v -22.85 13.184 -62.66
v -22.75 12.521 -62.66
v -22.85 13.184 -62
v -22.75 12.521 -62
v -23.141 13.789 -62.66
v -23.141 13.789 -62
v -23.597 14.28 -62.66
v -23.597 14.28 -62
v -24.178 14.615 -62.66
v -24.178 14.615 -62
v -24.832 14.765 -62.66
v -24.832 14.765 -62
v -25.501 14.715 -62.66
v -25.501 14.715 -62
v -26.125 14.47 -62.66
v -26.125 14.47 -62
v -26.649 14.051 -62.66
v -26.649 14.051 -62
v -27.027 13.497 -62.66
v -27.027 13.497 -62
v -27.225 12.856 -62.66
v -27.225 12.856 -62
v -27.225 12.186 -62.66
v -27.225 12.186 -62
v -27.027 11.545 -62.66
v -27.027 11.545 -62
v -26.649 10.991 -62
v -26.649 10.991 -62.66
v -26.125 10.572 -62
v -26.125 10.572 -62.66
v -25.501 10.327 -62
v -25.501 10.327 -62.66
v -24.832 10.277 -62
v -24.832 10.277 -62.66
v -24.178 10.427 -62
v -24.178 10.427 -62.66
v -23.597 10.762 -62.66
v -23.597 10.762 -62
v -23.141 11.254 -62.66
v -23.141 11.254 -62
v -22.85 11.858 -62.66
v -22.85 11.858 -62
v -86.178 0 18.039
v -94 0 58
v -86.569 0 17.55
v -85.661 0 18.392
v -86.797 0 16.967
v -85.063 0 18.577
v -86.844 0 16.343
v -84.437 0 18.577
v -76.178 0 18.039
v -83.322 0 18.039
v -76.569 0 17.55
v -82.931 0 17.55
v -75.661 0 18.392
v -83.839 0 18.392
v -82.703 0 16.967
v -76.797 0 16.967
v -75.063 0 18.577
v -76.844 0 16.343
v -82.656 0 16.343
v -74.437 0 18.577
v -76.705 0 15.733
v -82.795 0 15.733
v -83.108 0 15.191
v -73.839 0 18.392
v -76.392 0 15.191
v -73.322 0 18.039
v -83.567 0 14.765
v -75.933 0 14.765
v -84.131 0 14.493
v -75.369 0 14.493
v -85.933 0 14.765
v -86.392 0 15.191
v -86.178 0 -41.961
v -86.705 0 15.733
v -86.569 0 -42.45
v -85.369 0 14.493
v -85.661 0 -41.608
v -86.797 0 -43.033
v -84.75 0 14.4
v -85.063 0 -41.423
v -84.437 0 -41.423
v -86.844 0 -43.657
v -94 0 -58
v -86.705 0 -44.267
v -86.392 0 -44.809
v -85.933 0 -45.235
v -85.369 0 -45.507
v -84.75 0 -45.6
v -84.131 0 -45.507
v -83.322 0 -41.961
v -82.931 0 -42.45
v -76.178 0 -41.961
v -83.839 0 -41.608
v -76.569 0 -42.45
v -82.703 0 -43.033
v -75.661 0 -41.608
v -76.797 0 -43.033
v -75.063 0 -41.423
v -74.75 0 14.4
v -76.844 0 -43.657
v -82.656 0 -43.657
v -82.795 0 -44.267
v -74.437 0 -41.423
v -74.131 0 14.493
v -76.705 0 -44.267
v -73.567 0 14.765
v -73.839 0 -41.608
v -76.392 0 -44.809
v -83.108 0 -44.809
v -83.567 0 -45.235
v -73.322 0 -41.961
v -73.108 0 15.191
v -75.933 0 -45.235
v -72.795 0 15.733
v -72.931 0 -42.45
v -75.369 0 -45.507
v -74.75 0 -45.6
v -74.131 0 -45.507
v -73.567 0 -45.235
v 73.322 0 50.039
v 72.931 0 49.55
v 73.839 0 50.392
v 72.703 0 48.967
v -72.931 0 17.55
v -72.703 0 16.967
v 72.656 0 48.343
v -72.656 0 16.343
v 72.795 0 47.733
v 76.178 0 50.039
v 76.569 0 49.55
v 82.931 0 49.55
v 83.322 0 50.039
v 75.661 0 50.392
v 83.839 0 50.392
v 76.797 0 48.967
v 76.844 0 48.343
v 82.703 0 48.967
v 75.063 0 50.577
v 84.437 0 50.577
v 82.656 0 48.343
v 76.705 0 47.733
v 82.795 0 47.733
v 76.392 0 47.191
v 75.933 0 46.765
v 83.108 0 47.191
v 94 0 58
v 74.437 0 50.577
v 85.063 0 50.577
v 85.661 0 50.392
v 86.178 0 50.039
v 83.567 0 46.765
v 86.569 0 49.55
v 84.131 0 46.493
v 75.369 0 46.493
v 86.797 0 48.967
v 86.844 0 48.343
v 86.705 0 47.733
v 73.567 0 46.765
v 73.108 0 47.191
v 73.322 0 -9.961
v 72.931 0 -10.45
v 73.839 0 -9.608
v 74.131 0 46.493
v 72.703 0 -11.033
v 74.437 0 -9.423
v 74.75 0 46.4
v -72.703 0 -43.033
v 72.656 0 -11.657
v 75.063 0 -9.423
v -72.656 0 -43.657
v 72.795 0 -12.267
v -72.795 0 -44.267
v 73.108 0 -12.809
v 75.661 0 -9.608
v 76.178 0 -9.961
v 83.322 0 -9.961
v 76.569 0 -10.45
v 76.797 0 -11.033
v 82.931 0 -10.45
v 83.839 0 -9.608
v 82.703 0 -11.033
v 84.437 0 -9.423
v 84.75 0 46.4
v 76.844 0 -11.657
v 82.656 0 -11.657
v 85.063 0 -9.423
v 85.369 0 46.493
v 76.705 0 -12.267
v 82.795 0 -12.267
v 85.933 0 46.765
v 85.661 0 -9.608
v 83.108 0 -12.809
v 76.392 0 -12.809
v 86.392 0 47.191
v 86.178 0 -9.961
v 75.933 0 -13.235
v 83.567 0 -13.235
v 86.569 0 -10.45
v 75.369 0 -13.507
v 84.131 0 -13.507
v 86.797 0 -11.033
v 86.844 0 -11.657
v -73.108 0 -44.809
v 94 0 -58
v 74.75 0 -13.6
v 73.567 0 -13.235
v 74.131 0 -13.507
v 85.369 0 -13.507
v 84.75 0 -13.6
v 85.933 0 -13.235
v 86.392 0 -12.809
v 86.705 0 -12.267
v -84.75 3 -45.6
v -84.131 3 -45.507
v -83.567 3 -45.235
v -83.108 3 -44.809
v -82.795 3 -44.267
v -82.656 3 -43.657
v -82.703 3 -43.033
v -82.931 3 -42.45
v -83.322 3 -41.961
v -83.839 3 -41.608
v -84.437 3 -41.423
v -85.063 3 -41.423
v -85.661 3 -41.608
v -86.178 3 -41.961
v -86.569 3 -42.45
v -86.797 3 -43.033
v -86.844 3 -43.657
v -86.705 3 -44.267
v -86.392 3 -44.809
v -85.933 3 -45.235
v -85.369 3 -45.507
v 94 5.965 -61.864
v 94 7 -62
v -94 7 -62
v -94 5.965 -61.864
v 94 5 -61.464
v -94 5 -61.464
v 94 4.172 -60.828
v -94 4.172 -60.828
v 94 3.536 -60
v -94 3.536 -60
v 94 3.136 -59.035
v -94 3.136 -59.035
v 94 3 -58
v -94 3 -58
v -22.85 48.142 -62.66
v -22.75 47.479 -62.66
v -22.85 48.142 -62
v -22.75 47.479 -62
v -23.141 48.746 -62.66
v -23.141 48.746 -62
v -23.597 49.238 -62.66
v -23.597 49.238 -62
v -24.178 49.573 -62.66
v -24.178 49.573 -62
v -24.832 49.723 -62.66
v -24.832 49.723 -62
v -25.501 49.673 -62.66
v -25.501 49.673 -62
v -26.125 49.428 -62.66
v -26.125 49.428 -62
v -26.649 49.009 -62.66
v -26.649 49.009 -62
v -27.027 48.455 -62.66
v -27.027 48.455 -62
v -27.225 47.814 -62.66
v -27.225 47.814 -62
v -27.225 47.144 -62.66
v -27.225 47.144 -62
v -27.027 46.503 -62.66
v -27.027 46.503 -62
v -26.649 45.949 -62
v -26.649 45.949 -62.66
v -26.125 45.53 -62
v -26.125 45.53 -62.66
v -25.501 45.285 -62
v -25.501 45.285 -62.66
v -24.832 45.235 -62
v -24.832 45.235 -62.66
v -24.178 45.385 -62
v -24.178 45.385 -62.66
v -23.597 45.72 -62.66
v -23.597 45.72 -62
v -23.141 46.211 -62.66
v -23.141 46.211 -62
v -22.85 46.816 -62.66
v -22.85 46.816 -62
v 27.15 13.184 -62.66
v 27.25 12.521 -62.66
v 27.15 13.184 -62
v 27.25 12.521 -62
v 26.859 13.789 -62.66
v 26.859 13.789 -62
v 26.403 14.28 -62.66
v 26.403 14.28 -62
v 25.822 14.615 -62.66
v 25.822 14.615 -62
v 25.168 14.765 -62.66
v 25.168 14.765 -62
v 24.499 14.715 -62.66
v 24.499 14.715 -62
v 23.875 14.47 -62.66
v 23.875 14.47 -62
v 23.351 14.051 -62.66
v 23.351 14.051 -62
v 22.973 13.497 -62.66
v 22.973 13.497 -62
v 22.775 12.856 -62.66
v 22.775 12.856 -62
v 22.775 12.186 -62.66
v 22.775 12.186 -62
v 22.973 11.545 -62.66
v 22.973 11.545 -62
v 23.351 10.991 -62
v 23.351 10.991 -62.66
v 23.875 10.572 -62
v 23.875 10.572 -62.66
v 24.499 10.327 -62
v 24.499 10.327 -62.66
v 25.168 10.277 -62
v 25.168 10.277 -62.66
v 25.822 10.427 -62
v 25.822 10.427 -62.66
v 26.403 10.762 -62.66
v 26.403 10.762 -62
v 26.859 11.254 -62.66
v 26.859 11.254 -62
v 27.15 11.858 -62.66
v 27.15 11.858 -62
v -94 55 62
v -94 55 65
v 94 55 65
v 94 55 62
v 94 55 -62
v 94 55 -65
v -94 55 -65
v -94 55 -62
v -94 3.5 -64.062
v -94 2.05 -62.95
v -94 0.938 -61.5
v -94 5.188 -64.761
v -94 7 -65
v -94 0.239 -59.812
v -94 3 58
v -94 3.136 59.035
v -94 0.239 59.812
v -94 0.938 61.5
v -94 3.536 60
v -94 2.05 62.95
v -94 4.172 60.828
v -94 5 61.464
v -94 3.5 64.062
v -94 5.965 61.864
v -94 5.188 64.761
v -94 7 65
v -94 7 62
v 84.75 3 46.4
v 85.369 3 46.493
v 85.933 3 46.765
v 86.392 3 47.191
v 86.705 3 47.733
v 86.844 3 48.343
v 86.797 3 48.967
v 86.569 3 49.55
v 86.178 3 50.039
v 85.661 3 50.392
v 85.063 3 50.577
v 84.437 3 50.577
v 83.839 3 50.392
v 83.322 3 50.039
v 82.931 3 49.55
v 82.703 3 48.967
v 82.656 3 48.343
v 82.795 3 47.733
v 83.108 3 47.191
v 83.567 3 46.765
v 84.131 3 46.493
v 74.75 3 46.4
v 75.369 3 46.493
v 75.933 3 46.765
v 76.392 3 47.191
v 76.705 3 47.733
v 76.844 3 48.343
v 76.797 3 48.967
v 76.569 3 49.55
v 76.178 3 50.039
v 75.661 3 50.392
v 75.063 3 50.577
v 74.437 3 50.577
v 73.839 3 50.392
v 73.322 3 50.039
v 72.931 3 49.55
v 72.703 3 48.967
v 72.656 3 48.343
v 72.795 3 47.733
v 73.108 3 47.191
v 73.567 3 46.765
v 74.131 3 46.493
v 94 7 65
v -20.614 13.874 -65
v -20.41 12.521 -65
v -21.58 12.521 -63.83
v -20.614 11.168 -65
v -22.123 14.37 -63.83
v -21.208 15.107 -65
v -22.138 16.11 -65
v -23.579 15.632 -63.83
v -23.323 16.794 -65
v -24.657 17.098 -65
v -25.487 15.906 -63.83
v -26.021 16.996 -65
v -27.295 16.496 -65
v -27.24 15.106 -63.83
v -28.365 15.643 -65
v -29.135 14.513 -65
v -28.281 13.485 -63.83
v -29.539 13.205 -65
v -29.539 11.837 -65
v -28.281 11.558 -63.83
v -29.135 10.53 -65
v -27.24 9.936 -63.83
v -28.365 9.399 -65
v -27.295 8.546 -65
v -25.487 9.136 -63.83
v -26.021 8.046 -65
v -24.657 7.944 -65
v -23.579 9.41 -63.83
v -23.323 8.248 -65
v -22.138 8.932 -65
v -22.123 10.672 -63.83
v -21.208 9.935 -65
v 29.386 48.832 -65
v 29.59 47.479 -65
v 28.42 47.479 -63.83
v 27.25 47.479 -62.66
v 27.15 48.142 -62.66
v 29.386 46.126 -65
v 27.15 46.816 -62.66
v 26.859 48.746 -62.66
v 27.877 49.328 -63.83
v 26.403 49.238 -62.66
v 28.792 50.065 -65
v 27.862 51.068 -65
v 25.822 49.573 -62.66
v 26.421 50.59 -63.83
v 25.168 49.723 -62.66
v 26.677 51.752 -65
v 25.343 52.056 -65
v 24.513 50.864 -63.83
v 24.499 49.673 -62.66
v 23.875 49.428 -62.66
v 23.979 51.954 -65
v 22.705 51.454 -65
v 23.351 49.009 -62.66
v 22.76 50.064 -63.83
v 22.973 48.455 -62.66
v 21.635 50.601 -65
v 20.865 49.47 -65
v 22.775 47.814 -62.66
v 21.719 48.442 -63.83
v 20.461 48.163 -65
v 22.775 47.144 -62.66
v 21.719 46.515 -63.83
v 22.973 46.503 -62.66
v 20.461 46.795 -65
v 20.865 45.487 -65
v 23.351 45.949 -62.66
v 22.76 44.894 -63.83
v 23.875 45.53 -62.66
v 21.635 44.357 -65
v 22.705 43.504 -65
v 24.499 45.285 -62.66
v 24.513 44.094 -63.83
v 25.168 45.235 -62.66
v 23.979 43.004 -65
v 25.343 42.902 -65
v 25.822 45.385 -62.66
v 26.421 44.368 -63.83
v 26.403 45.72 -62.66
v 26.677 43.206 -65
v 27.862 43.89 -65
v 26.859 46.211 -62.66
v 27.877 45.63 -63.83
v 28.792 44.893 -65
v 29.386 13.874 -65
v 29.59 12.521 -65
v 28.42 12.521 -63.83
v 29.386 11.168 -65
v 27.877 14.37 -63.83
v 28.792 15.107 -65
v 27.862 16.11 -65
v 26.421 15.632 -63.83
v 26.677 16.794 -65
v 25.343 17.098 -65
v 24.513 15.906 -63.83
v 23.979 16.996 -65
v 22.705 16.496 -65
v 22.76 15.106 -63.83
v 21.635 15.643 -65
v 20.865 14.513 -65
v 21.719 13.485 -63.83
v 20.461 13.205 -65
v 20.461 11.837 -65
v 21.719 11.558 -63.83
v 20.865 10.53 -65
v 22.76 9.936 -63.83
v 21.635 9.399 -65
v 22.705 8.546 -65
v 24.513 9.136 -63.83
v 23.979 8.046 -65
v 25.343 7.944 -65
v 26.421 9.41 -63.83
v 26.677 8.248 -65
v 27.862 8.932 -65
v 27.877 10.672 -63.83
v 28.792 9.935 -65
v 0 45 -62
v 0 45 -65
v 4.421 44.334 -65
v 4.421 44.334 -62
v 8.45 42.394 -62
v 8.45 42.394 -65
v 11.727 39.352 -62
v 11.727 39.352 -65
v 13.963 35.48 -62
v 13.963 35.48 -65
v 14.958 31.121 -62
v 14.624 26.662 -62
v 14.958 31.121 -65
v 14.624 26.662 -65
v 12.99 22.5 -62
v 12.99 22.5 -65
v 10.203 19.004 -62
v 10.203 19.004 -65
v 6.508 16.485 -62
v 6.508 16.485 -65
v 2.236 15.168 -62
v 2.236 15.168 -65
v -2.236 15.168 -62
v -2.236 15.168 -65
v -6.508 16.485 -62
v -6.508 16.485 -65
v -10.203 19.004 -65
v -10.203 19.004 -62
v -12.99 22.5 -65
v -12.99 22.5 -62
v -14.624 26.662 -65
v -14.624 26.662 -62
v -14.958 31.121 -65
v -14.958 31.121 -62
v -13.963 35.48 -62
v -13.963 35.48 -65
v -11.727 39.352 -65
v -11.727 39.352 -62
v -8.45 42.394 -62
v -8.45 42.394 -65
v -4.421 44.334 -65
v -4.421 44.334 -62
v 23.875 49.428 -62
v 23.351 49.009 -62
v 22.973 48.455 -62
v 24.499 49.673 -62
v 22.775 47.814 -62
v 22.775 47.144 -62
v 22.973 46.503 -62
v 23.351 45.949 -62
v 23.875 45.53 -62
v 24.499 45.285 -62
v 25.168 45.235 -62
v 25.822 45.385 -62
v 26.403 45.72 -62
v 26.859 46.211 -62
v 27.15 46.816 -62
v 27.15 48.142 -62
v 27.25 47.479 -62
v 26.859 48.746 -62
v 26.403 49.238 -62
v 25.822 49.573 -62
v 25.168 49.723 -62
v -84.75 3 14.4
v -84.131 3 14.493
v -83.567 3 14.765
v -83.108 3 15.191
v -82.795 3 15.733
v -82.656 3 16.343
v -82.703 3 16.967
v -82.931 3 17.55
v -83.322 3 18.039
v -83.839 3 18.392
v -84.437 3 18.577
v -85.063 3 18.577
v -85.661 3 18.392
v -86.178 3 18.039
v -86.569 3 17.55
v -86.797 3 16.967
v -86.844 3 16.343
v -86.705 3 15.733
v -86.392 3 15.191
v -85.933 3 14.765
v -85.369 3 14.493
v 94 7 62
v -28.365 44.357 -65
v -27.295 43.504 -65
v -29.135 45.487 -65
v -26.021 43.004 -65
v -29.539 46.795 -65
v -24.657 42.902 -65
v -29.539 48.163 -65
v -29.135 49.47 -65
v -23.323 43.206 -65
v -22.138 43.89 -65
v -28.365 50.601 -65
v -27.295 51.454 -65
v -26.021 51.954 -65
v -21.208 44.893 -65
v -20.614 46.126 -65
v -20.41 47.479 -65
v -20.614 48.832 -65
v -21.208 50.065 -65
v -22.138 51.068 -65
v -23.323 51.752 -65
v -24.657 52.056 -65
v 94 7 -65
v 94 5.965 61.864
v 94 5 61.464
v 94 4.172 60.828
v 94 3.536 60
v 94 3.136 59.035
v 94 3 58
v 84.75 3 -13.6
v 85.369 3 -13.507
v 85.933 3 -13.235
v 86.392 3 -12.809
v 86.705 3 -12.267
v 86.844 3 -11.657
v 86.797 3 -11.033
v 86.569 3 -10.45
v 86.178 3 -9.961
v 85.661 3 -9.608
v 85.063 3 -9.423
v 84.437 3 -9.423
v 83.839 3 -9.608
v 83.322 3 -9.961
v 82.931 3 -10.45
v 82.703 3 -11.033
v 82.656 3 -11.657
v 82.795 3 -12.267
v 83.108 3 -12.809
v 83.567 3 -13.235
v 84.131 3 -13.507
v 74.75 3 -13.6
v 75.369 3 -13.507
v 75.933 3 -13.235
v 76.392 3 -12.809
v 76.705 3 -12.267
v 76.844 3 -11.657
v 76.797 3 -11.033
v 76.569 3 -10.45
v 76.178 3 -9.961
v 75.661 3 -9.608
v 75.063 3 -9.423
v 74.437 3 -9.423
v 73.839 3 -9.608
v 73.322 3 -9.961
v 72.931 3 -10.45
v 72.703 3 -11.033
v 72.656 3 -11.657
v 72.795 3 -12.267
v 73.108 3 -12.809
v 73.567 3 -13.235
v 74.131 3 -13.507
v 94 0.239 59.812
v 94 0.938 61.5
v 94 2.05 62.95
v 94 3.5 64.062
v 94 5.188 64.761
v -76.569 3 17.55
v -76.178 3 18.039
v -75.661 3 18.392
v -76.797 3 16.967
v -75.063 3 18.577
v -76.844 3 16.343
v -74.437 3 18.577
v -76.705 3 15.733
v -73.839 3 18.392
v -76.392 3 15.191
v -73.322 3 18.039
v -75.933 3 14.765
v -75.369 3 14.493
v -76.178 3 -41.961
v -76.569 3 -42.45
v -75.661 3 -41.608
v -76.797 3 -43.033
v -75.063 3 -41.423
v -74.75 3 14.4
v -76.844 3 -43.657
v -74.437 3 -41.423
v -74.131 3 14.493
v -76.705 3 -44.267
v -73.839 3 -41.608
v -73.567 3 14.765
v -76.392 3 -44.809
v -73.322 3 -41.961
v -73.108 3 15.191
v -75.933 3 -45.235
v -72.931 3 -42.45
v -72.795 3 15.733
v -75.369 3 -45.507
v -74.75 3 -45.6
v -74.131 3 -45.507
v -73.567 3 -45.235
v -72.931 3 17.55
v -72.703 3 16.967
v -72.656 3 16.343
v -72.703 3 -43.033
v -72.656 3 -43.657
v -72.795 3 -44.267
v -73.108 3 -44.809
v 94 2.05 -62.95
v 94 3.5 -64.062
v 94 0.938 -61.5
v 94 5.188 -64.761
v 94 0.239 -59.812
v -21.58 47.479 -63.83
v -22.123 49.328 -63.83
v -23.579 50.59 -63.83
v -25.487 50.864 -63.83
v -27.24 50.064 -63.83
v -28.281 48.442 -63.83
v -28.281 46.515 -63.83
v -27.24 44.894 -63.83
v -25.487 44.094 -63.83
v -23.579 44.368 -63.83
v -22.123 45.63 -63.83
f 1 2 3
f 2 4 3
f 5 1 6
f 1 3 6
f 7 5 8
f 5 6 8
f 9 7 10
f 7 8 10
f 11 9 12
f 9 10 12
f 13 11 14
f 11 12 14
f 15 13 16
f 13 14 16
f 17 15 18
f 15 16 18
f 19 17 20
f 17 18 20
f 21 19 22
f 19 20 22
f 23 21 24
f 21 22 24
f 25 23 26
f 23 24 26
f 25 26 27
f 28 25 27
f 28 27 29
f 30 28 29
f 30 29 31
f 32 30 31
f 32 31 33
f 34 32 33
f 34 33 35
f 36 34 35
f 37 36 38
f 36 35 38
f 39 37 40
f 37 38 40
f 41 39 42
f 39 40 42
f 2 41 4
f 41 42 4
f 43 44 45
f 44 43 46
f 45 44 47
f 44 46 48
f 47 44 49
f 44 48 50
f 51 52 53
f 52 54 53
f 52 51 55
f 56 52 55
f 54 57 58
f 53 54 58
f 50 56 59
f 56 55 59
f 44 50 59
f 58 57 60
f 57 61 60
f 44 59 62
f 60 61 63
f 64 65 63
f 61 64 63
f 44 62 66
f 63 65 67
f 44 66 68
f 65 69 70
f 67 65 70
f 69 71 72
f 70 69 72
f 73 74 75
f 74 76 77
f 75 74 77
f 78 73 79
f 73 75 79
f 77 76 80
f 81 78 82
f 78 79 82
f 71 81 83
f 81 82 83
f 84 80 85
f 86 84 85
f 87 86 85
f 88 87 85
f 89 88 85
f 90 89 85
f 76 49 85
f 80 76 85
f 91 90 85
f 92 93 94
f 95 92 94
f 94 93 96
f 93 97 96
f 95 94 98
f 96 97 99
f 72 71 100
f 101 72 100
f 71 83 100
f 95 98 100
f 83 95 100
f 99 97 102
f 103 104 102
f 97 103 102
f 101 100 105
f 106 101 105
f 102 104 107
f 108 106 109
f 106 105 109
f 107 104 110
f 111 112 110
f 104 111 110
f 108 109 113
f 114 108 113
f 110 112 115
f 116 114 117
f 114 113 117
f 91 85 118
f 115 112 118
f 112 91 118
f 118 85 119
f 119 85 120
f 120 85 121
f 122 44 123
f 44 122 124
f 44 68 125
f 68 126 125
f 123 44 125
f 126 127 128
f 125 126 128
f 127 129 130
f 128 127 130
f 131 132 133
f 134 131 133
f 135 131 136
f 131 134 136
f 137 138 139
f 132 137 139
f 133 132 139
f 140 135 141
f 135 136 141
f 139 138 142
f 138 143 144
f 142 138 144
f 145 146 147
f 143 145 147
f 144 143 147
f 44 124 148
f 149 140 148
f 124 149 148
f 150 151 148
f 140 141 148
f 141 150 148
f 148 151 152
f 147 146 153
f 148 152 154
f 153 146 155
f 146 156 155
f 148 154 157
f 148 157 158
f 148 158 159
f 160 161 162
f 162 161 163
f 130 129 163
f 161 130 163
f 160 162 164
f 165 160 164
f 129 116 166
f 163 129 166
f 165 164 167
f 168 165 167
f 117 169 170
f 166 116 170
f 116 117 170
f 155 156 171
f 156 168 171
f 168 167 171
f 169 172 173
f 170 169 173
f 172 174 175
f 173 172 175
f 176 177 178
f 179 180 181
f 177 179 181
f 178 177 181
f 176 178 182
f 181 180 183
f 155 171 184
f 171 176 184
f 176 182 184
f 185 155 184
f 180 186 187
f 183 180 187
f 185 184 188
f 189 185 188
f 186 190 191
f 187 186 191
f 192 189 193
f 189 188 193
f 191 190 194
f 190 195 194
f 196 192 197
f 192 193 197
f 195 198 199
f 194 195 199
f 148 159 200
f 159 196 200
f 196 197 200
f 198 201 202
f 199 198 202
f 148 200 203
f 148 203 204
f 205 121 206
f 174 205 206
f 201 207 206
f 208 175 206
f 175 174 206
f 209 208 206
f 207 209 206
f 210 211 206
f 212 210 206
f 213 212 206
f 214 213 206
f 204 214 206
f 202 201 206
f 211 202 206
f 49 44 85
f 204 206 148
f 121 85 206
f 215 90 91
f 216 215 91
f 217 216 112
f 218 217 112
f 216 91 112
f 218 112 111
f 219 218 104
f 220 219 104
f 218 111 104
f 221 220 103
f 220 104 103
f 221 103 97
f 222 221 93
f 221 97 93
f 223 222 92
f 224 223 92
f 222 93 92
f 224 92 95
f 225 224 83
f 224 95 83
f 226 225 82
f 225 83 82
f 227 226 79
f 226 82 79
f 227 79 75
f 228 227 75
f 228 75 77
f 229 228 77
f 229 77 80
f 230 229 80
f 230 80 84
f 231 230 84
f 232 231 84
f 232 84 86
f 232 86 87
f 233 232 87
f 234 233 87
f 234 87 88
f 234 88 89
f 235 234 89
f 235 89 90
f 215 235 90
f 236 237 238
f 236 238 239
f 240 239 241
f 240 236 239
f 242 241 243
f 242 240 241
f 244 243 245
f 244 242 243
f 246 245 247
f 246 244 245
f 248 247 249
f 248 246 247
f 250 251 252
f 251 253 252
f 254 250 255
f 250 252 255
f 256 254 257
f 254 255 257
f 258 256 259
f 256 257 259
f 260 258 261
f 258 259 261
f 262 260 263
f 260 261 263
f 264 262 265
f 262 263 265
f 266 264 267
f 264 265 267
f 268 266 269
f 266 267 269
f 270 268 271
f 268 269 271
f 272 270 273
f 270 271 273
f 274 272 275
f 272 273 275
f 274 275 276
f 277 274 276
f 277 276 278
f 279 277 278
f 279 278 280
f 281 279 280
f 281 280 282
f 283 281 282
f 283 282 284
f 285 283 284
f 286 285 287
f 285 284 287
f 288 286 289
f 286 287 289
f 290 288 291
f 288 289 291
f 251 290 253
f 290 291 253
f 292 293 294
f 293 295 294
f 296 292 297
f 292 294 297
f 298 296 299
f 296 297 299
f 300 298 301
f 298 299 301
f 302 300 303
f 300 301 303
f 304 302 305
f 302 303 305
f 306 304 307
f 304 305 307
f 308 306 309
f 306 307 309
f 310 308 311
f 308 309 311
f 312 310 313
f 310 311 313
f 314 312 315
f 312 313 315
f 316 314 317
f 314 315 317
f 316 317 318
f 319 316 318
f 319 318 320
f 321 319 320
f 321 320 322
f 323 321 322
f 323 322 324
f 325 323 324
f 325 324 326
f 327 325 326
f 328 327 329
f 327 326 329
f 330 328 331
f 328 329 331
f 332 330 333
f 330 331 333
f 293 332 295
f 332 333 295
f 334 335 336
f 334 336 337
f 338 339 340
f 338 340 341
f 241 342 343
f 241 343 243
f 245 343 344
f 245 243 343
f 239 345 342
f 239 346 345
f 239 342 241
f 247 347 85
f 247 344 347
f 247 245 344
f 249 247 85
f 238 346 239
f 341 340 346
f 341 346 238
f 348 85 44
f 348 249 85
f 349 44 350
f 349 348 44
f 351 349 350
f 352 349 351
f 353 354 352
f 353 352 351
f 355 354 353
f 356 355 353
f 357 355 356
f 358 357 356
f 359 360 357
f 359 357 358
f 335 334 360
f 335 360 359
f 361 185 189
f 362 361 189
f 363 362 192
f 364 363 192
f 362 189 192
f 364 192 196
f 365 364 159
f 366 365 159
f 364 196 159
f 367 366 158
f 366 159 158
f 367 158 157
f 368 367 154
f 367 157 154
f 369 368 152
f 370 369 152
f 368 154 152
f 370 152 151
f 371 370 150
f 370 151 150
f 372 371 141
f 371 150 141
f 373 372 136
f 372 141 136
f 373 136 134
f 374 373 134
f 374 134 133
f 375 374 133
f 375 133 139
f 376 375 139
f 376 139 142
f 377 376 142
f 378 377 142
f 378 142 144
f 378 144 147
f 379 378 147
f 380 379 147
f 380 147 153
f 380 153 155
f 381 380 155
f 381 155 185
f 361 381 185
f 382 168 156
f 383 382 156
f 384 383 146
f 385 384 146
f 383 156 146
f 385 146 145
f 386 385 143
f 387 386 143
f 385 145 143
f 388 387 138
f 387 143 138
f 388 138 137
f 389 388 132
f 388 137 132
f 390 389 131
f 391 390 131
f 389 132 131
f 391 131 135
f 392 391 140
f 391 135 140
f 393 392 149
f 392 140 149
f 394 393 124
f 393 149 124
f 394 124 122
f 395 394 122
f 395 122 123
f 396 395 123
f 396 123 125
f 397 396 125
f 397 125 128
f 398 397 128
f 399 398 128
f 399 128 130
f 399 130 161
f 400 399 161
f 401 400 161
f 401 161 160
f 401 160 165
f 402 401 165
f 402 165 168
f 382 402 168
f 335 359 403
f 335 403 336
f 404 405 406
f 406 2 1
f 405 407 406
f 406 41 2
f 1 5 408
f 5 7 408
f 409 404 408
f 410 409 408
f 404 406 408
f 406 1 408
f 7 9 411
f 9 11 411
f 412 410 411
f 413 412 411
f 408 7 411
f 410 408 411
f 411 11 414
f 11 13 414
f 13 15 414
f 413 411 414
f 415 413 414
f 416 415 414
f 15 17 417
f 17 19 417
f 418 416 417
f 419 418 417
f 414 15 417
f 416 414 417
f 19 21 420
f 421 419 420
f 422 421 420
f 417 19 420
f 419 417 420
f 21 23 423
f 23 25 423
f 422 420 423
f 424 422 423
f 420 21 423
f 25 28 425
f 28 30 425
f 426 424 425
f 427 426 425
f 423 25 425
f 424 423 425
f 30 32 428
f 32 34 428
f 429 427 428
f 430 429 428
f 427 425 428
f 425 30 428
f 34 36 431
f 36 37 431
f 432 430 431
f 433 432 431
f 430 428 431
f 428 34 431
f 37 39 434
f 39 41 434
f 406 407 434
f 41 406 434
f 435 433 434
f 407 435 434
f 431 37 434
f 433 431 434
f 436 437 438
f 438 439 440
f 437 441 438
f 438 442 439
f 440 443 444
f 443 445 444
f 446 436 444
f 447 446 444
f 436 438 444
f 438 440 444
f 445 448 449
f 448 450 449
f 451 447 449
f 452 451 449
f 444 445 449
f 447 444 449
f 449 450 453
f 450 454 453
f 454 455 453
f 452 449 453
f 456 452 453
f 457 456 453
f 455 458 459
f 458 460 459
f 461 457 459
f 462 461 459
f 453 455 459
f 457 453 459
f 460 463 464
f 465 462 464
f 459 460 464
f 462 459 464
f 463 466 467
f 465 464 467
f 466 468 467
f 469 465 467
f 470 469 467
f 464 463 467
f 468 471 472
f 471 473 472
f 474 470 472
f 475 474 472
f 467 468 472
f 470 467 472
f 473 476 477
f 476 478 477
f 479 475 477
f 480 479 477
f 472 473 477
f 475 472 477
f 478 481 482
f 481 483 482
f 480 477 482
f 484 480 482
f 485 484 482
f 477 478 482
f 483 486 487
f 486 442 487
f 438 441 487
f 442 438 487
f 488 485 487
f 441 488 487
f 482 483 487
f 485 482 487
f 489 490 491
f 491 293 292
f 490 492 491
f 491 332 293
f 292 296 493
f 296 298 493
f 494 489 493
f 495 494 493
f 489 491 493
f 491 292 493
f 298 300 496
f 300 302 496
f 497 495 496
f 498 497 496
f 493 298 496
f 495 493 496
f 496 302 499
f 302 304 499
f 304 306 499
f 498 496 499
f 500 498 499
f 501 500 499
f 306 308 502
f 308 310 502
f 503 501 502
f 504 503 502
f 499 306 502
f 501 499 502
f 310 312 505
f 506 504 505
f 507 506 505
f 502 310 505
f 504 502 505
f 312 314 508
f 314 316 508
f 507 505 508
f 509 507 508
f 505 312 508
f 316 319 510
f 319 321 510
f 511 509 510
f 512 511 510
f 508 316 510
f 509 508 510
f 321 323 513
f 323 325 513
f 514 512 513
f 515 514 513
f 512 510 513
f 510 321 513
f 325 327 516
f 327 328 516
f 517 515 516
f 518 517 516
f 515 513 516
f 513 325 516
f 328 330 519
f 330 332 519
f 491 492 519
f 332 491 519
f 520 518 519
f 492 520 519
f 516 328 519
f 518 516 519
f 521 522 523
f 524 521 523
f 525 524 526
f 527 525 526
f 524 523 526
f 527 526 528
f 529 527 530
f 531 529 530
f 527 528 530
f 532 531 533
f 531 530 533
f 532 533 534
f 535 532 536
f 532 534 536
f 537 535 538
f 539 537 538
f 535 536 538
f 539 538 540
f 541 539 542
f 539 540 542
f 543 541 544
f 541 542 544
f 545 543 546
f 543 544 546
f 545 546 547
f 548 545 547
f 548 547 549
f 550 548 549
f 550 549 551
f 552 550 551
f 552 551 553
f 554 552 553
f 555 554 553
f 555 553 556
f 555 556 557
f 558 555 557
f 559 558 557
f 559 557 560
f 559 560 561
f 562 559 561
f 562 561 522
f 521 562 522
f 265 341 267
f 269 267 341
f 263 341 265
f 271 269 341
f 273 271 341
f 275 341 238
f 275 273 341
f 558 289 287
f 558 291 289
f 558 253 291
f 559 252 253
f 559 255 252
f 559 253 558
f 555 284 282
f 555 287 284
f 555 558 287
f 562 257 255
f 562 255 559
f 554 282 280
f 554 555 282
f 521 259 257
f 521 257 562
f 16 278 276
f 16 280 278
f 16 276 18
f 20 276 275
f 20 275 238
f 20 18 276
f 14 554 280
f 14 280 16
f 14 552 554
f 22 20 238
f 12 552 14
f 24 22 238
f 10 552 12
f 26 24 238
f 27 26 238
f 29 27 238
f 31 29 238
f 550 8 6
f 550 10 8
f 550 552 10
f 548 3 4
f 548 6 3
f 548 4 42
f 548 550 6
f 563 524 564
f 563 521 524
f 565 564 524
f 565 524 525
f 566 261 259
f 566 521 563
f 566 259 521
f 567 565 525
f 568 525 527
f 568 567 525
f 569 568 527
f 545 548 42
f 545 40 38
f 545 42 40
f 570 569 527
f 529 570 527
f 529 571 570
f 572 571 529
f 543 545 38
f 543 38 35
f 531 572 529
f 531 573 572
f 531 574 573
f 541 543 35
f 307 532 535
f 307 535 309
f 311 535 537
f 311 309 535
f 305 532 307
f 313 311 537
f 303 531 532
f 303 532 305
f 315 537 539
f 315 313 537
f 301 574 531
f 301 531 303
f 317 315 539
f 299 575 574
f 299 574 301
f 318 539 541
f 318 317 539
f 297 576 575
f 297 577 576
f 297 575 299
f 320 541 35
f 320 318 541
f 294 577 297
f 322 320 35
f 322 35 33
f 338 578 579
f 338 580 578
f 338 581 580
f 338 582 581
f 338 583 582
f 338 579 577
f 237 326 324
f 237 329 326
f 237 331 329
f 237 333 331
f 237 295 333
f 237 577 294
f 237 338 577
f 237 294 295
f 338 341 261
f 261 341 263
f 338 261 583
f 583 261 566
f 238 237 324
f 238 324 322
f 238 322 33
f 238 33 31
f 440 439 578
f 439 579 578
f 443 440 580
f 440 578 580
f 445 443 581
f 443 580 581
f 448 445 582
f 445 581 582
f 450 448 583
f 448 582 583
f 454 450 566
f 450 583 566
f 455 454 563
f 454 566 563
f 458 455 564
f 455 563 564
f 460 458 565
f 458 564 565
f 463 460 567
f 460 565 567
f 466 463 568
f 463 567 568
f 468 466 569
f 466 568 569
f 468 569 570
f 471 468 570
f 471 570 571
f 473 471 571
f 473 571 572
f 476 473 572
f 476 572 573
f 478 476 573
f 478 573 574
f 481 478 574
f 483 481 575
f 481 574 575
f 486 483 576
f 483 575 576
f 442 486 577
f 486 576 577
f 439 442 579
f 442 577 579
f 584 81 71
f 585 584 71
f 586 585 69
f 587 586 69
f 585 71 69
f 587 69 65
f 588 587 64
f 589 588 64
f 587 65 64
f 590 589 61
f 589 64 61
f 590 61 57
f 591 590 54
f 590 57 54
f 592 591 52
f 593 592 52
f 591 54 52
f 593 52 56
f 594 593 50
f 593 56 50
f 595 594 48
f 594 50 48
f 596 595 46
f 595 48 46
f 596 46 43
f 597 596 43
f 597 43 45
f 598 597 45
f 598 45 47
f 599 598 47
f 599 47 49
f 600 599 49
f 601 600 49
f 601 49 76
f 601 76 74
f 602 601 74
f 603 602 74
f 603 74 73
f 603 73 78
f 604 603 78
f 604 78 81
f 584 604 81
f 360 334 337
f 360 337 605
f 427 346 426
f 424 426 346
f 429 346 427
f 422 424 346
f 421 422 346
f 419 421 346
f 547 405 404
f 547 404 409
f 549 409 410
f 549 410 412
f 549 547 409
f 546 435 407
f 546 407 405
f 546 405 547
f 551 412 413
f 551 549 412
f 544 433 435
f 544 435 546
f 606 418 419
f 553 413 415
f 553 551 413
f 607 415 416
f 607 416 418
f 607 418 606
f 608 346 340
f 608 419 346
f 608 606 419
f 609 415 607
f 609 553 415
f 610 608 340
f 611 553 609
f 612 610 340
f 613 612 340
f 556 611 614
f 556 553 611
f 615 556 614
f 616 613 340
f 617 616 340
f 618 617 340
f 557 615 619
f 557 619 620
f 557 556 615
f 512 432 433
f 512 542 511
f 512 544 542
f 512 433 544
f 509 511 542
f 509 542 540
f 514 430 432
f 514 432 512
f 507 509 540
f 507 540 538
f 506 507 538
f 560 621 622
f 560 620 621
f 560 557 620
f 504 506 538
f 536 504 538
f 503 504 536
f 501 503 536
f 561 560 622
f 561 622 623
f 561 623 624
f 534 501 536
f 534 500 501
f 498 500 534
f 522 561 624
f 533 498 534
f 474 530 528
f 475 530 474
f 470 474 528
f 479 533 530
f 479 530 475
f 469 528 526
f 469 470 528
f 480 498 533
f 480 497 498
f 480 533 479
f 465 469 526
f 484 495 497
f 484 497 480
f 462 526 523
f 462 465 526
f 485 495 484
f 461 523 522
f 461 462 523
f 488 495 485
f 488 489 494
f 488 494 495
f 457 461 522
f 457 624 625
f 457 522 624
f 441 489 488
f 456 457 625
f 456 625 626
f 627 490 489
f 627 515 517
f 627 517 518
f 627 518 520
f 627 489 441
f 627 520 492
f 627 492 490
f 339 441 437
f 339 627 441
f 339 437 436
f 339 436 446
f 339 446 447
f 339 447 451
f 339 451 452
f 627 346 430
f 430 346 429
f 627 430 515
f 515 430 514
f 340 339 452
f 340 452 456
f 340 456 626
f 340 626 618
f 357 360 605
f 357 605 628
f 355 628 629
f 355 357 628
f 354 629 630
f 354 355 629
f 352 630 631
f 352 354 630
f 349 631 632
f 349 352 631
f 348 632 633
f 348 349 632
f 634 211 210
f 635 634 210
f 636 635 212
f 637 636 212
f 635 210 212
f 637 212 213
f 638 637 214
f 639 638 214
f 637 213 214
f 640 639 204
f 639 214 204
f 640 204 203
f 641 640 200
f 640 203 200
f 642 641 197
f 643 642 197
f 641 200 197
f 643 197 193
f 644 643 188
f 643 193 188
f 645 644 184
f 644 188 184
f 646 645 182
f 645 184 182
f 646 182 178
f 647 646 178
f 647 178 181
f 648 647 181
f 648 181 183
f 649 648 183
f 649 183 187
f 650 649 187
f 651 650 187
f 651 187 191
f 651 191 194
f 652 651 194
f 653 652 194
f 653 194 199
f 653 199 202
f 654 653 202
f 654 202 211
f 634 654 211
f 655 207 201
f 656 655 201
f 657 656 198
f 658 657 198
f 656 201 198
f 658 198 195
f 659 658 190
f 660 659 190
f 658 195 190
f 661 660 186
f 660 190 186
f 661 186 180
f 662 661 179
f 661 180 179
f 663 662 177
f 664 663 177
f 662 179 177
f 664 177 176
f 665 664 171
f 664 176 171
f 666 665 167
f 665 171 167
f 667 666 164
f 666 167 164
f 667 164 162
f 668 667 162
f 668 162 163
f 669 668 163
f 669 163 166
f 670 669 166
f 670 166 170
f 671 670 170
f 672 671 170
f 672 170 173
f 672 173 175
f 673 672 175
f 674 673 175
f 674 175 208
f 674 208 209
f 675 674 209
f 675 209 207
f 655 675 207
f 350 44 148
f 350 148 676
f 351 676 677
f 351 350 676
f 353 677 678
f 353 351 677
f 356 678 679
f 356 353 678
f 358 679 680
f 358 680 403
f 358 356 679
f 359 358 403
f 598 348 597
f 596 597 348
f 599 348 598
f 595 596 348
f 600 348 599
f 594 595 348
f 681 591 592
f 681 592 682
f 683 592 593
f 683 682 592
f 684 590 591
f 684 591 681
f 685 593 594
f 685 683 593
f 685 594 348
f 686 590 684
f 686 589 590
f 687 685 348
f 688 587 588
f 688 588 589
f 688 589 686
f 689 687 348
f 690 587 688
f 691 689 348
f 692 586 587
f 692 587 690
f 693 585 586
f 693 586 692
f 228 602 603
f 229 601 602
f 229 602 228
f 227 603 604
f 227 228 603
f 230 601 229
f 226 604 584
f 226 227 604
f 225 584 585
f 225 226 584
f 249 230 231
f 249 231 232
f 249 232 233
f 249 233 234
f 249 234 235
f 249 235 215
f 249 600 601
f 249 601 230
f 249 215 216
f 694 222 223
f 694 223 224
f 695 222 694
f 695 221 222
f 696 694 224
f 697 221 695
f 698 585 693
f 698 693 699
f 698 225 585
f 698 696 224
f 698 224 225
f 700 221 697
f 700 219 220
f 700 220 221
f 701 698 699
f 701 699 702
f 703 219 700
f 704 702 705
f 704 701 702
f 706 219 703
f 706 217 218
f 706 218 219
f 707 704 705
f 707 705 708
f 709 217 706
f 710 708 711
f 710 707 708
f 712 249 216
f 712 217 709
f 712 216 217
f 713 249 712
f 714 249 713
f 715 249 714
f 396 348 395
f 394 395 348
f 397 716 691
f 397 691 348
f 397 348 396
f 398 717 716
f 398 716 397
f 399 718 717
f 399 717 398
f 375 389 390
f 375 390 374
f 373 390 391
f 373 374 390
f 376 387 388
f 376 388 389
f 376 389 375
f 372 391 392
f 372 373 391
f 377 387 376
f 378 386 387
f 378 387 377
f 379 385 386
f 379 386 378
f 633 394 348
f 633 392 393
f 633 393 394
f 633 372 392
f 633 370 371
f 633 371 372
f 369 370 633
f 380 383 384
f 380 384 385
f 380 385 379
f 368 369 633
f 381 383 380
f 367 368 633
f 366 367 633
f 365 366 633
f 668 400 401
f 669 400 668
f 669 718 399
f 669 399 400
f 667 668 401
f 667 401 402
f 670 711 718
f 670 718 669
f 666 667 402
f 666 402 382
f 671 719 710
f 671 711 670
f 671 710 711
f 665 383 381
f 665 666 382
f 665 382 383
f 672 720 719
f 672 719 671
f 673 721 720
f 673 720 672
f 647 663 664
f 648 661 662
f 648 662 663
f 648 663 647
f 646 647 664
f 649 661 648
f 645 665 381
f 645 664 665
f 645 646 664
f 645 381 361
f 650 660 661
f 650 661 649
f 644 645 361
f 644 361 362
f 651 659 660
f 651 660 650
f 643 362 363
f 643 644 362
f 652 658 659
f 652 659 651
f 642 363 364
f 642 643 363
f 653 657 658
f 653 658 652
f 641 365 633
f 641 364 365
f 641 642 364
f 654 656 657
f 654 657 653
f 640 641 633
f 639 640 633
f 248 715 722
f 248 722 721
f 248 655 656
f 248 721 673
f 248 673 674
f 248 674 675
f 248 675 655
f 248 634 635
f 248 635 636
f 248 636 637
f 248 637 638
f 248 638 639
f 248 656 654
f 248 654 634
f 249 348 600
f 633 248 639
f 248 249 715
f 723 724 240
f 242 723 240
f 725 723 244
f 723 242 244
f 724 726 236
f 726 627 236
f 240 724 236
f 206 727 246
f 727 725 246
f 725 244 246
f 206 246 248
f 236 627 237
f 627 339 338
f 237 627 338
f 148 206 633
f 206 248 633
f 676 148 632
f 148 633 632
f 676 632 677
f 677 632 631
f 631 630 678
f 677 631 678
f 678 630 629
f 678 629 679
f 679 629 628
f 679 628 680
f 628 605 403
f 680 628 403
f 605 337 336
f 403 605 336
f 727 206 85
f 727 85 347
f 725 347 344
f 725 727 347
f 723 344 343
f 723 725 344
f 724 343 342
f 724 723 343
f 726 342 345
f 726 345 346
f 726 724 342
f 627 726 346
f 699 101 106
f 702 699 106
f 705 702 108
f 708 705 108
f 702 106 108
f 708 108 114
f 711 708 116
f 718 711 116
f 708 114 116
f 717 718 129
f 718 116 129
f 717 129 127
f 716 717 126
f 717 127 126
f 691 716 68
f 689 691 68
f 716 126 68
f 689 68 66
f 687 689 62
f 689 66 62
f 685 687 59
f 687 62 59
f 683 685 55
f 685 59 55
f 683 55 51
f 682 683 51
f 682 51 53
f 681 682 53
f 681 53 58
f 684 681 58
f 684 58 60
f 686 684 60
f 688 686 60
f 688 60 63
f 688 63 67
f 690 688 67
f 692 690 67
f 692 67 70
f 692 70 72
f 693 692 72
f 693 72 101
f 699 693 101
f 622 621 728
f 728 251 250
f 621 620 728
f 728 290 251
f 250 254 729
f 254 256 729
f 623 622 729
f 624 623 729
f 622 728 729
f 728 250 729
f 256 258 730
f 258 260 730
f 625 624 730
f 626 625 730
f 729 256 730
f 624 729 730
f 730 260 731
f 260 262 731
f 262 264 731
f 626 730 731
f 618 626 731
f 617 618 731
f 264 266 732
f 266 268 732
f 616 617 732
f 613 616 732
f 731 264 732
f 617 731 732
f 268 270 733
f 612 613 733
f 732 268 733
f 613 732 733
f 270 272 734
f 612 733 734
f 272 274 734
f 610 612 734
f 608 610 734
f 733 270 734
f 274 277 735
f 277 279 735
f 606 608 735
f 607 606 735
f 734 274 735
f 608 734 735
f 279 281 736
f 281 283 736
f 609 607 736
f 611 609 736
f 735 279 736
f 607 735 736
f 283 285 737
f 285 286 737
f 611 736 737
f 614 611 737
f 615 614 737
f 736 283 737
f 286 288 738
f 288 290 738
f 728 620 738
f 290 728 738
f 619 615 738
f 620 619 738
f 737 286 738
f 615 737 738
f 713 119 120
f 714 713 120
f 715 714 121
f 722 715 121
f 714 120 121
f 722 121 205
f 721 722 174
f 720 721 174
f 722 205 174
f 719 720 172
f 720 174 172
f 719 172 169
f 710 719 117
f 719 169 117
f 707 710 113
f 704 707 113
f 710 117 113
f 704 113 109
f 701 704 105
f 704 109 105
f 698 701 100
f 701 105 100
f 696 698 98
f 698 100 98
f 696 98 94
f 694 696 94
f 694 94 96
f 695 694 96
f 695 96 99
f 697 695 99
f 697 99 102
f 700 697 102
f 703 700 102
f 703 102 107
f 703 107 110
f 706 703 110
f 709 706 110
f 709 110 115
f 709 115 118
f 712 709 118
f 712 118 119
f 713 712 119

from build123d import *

# Parameters (mm, degrees)
SKETCH1_W                                            = 188
SKETCH1_H                                            = 130
BOSS_EXTRUDE1_DEPTH                                  = 3
EDGE_FLANGE1_STRIP_W                                 = 20
EDGE_FLANGE1_STRIP_H                                 = 3
EDGE_FLANGE1_STRIP_CUT_DEPTH                         = 188
EDGE_FLANGE1_STRIP_2_W                               = 20
EDGE_FLANGE1_STRIP_2_H                               = 3
EDGE_FLANGE1_STRIP_CUT_2_DEPTH                       = 188
EDGE_FLANGE1_DEPTH                                   = 188
EDGE_FLANGE1_BEND_DEPTH                              = 188
SKETCH8_R                                            = 15
CUT_EXTRUDE1_DEPTH                                   = 10
CSK_FOR_M4_HEX_SOCKET_COUNTERSUNK_HEAD_S_D           = 4.5
CSK_FOR_M4_HEX_SOCKET_COUNTERSUNK_HEAD_S_DEPTH       = 10
CSK_FOR_M4_HEX_SOCKET_COUNTERSUNK_HEAD_S_CSINK_D     = 9.18
CSK_FOR_M4_HEX_SOCKET_COUNTERSUNK_HEAD_S_CSINK_ANGLE = 90
CSK_FOR_M4_HEX_SOCKET_COUNTERSUNK_HEAD_S_TIP         = 1.351936393
SKETCH12_R                                           = 2.1
CUT_EXTRUDE2_DEPTH                                   = 10


# Sheet-metal steps are written as plain solids
with BuildPart() as part:
    # Sketch1 → Boss-Extrude1 (new body)
    with BuildSketch(Plane(origin=(0, 0, 0), x_dir=(1, 0, 0), z_dir=(0, 1, 0))):
        Rectangle(SKETCH1_W, SKETCH1_H)
    extrude(amount=BOSS_EXTRUDE1_DEPTH)

    # Edge-Flange1 strip (across the edge) → Edge-Flange1 strip cut (cut)
    with BuildSketch(Plane(origin=(94, 3, -65), x_dir=(0, 0, 1), z_dir=(-1, 0, 0))):
        with Locations((-3, -1.5)):
            Rectangle(EDGE_FLANGE1_STRIP_W, EDGE_FLANGE1_STRIP_H)
    extrude(amount=EDGE_FLANGE1_STRIP_CUT_DEPTH, mode=Mode.SUBTRACT)

    # Edge-Flange1 strip 2 (across the edge) → Edge-Flange1 strip cut 2 (cut)
    with BuildSketch(Plane(origin=(-94, 3, 65), x_dir=(0, 0, -1), z_dir=(1, 0, 0))):
        with Locations((-3, -1.5)):
            Rectangle(EDGE_FLANGE1_STRIP_2_W, EDGE_FLANGE1_STRIP_2_H)
    extrude(amount=EDGE_FLANGE1_STRIP_CUT_2_DEPTH, mode=Mode.SUBTRACT)

    # Edge-Flange1 section (across the edge) → Edge-Flange1 (add)
    with BuildSketch(Plane(origin=(94, 3, -65), x_dir=(0, 0, 1), z_dir=(-1, 0, 0))):
        with BuildLine():
            Line((0, 4), (0, 52))
            Line((0, 52), (3, 52))
            Line((3, 52), (3, 4))
            ThreePointArc((3, 4), (4.171572875, 1.171572875), (7, 0))
            Line((7, 0), (7, -3))
            ThreePointArc((7, -3), (2.050252532, -0.949747468), (0, 4))
        make_face()
    extrude(amount=EDGE_FLANGE1_DEPTH)

    # Edge-Flange1 section 2 (across the edge) → Edge-Flange1 bend (add)
    with BuildSketch(Plane(origin=(-94, 3, 65), x_dir=(0, 0, -1), z_dir=(1, 0, 0))):
        with BuildLine():
            Line((0, 4), (0, 52))
            Line((0, 52), (3, 52))
            Line((3, 52), (3, 4))
            ThreePointArc((3, 4), (4.171572875, 1.171572875), (7, 0))
            Line((7, 0), (7, -3))
            ThreePointArc((7, -3), (2.050252532, -0.949747468), (0, 4))
        make_face()
    extrude(amount=EDGE_FLANGE1_BEND_DEPTH)

    # Sketch8 → Cut-Extrude1 (cut)
    with BuildSketch(Plane(origin=(0, 0, -65), x_dir=(-1, 0, 0), z_dir=(0, 0, -1))):
        with Locations(Location((0, 30, 0), (0, 0, 90))):
            Circle(SKETCH8_R)
    extrude(amount=-CUT_EXTRUDE1_DEPTH, mode=Mode.SUBTRACT)

    # CSK for M4 Hex Socket Countersunk Head Screw1
    with Locations(Plane(origin=(0, 0, -65), x_dir=(-1, 0, 0), z_dir=(0, 0, -1))):
        with Locations((-25, 47.478966411), (-25, 12.521033589), (25, 47.478966411), (25, 12.521033589)):
            CounterSinkHole(CSK_FOR_M4_HEX_SOCKET_COUNTERSUNK_HEAD_S_D / 2, CSK_FOR_M4_HEX_SOCKET_COUNTERSUNK_HEAD_S_CSINK_D / 2, depth=CSK_FOR_M4_HEX_SOCKET_COUNTERSUNK_HEAD_S_DEPTH, counter_sink_angle=CSK_FOR_M4_HEX_SOCKET_COUNTERSUNK_HEAD_S_CSINK_ANGLE)
            with Locations((0, 0, -(CSK_FOR_M4_HEX_SOCKET_COUNTERSUNK_HEAD_S_DEPTH + CSK_FOR_M4_HEX_SOCKET_COUNTERSUNK_HEAD_S_TIP / 2))):  # 118° drill point
                Cone(0, CSK_FOR_M4_HEX_SOCKET_COUNTERSUNK_HEAD_S_D / 2, CSK_FOR_M4_HEX_SOCKET_COUNTERSUNK_HEAD_S_TIP, mode=Mode.SUBTRACT)

    # Sketch12 → Cut-Extrude2 (cut)
    with BuildSketch(Plane(origin=(0, 0, 0), x_dir=(-1, 0, 0), z_dir=(0, -1, 0))):
        with Locations(Location((74.75, 43.5, 0), (0, 0, 90))):
            Circle(SKETCH12_R)
        with Locations(Location((84.75, 43.5, 0), (0, 0, 90))):
            Circle(SKETCH12_R)
        with Locations(Location((74.75, -16.5, 0), (0, 0, 90))):
            Circle(SKETCH12_R)
        with Locations(Location((84.75, -16.5, 0), (0, 0, 90))):
            Circle(SKETCH12_R)
        with Locations(Location((-74.75, 11.5, 0), (0, 0, 90))):
            Circle(SKETCH12_R)
        with Locations(Location((-84.75, 11.5, 0), (0, 0, 90))):
            Circle(SKETCH12_R)
        with Locations(Location((-74.75, -48.5, 0), (0, 0, 90))):
            Circle(SKETCH12_R)
        with Locations(Location((-84.75, -48.5, 0), (0, 0, 90))):
            Circle(SKETCH12_R)
    extrude(amount=-CUT_EXTRUDE2_DEPTH, mode=Mode.SUBTRACT)


solid = part.part
